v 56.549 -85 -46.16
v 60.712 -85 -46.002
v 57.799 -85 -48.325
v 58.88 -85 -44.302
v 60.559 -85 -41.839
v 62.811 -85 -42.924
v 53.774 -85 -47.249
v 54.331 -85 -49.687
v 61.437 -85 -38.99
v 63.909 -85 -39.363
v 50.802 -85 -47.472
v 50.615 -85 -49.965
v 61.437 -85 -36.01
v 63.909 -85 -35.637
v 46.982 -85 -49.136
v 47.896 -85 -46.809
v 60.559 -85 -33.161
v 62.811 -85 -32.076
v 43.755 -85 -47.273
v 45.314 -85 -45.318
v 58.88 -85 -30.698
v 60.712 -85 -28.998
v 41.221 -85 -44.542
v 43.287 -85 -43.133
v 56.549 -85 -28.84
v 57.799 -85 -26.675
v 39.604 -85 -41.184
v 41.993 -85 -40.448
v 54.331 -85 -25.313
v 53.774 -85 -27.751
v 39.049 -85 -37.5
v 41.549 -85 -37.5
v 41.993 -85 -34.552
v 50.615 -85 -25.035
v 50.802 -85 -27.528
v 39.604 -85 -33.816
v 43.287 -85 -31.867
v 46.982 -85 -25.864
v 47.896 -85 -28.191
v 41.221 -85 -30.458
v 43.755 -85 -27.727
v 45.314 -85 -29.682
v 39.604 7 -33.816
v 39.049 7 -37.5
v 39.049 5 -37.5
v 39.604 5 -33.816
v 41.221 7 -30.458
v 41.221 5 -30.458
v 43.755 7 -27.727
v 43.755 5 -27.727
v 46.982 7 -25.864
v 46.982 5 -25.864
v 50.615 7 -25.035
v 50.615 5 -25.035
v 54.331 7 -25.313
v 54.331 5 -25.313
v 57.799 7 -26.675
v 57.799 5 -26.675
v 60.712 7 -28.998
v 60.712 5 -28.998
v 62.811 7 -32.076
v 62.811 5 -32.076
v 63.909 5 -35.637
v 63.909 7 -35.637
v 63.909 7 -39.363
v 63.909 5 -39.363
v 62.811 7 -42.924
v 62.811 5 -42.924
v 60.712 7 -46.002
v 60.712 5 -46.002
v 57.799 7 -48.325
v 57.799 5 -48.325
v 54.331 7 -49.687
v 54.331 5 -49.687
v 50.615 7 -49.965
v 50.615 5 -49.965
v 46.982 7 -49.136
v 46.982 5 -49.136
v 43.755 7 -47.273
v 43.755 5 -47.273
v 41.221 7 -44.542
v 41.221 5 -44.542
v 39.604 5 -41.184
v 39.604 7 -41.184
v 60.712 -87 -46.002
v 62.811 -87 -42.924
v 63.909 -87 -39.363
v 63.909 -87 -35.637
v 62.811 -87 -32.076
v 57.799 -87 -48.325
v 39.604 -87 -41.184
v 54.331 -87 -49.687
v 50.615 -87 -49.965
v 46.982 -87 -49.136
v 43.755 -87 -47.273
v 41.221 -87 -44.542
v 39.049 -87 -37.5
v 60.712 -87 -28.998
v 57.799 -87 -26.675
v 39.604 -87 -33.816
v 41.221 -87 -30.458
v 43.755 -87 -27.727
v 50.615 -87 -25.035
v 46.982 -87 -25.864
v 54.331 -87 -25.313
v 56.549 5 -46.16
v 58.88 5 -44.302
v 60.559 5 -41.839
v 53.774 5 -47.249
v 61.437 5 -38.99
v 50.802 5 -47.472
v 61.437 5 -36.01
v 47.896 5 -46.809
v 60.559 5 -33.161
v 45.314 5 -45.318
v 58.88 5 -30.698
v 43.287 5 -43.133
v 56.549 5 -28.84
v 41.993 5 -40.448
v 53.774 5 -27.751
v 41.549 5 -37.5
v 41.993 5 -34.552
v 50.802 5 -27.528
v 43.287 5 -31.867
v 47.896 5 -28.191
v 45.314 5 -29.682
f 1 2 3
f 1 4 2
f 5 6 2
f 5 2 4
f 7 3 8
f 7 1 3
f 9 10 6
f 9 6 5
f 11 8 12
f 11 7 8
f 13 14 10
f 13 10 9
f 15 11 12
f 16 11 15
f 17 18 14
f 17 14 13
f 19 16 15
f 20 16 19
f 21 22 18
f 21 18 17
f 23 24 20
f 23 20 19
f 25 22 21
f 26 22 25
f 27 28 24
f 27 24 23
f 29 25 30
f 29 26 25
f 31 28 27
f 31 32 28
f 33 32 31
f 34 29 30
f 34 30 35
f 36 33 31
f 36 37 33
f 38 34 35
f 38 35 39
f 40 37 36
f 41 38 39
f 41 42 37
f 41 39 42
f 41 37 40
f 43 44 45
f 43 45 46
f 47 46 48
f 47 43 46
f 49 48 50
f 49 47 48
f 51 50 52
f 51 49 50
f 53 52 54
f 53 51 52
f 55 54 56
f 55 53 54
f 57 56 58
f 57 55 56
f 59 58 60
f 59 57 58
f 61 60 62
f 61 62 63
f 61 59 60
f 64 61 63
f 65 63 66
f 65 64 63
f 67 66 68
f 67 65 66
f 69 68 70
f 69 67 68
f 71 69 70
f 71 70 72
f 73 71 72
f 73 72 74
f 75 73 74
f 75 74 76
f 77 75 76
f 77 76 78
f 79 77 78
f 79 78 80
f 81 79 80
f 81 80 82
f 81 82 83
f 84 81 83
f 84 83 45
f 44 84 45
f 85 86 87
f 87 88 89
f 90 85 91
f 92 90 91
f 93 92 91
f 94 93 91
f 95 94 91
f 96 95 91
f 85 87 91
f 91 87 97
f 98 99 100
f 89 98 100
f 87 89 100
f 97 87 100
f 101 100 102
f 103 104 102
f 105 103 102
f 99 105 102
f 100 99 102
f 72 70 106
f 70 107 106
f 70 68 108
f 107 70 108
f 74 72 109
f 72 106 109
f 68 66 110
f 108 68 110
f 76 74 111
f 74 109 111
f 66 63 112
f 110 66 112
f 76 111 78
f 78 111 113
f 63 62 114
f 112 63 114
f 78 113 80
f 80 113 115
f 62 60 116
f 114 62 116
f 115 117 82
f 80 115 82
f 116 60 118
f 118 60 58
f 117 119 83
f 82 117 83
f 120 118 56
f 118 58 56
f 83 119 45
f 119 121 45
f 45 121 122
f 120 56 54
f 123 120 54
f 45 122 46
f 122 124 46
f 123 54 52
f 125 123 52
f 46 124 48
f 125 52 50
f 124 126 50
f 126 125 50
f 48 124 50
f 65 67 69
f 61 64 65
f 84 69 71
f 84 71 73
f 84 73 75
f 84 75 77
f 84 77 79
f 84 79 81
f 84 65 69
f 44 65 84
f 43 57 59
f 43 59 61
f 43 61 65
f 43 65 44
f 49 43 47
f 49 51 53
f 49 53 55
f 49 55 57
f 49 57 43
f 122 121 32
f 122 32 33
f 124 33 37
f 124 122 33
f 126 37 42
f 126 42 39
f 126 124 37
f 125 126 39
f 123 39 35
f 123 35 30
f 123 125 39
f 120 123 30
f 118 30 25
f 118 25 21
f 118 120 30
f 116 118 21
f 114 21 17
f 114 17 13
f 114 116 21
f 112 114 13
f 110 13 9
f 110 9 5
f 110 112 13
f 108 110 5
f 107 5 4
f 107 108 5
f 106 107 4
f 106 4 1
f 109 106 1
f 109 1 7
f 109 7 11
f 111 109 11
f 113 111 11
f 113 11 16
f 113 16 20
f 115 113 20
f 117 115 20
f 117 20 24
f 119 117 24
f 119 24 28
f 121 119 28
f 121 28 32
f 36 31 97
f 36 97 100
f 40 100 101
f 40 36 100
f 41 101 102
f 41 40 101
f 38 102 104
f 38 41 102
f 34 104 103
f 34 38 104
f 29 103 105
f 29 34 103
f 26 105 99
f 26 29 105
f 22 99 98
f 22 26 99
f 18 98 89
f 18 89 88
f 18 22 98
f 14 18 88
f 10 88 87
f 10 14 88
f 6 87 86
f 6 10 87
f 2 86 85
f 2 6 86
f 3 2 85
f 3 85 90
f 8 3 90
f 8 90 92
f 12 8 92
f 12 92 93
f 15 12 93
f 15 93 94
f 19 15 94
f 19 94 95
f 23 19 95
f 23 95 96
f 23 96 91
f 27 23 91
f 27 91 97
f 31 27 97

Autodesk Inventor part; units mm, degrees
ref_plane "YZ Plane" through (0, 0, 0) normal (1, 0, 0) x (0, 1, 0)
ref_plane "XZ Plane" through (0, 0, 0) normal (0, 1, 0) x (-1, 0, 0)
ref_plane "XY Plane" through (0, 0, 0) normal (0, 0, 1) x (1, 0, 0)
ref_plane "Work Plane1" through (0, 0, 0) normal (0, 0, 1) x (1, 0, 0)
ref_plane "Work Plane2" through (0, 0, -37.5) normal (0, 0, 1) x (1, 0, 0)
sketch "Sketch1" plane through (0, 0, -37.5) normal (0, 0, 1) x (1, 0, 0)
  line L0 (41.5491, 5) -> (61.5491, 5) projected
  line L1 (41.5491, 5) -> (39.0491, 5)
  line L2 (39.0491, 5) -> (39.0491, 7)
  line L3 (39.0491, 7) -> (64.0491, 7)
  line L4 (64.0491, 7) -> (64.0491, 5)
  line L5 (64.0491, 5) -> (61.5491, 5)
  line L6 (61.5491, 5) -> (61.5491, -85)
  line L7 (61.5491, -85) -> (64.0491, -85)
  line L8 (64.0491, -85) -> (64.0491, -87)
  line L9 (64.0491, -87) -> (39.0491, -87)
  line L10 (39.0491, -87) -> (39.0491, -85)
  line L11 (39.0491, -85) -> (41.5491, -85)
  line L12 (41.5491, -85) -> (41.5491, 5)
  line L13 (51.5491, -97.5104) -> (51.5491, 34.0837)
  point P0 (0, 0)
  point P1 (51.5491, 7)
  point P2 (51.5491, -87)
  dimension "d1" = 2
  dimension "d5" = 90
  dimension "d12" = 25
  dimension "d13" = 2.5
revolve "Revolution1" add sketch "Sketch1" angle 360 about axis through (51.5491, -97.5104, -37.5) along (0, 1, 0) contours L1 L2 L3 L13 L0 | L0 L13 L9 L10 L11 L12
properties part number "nitR3"
